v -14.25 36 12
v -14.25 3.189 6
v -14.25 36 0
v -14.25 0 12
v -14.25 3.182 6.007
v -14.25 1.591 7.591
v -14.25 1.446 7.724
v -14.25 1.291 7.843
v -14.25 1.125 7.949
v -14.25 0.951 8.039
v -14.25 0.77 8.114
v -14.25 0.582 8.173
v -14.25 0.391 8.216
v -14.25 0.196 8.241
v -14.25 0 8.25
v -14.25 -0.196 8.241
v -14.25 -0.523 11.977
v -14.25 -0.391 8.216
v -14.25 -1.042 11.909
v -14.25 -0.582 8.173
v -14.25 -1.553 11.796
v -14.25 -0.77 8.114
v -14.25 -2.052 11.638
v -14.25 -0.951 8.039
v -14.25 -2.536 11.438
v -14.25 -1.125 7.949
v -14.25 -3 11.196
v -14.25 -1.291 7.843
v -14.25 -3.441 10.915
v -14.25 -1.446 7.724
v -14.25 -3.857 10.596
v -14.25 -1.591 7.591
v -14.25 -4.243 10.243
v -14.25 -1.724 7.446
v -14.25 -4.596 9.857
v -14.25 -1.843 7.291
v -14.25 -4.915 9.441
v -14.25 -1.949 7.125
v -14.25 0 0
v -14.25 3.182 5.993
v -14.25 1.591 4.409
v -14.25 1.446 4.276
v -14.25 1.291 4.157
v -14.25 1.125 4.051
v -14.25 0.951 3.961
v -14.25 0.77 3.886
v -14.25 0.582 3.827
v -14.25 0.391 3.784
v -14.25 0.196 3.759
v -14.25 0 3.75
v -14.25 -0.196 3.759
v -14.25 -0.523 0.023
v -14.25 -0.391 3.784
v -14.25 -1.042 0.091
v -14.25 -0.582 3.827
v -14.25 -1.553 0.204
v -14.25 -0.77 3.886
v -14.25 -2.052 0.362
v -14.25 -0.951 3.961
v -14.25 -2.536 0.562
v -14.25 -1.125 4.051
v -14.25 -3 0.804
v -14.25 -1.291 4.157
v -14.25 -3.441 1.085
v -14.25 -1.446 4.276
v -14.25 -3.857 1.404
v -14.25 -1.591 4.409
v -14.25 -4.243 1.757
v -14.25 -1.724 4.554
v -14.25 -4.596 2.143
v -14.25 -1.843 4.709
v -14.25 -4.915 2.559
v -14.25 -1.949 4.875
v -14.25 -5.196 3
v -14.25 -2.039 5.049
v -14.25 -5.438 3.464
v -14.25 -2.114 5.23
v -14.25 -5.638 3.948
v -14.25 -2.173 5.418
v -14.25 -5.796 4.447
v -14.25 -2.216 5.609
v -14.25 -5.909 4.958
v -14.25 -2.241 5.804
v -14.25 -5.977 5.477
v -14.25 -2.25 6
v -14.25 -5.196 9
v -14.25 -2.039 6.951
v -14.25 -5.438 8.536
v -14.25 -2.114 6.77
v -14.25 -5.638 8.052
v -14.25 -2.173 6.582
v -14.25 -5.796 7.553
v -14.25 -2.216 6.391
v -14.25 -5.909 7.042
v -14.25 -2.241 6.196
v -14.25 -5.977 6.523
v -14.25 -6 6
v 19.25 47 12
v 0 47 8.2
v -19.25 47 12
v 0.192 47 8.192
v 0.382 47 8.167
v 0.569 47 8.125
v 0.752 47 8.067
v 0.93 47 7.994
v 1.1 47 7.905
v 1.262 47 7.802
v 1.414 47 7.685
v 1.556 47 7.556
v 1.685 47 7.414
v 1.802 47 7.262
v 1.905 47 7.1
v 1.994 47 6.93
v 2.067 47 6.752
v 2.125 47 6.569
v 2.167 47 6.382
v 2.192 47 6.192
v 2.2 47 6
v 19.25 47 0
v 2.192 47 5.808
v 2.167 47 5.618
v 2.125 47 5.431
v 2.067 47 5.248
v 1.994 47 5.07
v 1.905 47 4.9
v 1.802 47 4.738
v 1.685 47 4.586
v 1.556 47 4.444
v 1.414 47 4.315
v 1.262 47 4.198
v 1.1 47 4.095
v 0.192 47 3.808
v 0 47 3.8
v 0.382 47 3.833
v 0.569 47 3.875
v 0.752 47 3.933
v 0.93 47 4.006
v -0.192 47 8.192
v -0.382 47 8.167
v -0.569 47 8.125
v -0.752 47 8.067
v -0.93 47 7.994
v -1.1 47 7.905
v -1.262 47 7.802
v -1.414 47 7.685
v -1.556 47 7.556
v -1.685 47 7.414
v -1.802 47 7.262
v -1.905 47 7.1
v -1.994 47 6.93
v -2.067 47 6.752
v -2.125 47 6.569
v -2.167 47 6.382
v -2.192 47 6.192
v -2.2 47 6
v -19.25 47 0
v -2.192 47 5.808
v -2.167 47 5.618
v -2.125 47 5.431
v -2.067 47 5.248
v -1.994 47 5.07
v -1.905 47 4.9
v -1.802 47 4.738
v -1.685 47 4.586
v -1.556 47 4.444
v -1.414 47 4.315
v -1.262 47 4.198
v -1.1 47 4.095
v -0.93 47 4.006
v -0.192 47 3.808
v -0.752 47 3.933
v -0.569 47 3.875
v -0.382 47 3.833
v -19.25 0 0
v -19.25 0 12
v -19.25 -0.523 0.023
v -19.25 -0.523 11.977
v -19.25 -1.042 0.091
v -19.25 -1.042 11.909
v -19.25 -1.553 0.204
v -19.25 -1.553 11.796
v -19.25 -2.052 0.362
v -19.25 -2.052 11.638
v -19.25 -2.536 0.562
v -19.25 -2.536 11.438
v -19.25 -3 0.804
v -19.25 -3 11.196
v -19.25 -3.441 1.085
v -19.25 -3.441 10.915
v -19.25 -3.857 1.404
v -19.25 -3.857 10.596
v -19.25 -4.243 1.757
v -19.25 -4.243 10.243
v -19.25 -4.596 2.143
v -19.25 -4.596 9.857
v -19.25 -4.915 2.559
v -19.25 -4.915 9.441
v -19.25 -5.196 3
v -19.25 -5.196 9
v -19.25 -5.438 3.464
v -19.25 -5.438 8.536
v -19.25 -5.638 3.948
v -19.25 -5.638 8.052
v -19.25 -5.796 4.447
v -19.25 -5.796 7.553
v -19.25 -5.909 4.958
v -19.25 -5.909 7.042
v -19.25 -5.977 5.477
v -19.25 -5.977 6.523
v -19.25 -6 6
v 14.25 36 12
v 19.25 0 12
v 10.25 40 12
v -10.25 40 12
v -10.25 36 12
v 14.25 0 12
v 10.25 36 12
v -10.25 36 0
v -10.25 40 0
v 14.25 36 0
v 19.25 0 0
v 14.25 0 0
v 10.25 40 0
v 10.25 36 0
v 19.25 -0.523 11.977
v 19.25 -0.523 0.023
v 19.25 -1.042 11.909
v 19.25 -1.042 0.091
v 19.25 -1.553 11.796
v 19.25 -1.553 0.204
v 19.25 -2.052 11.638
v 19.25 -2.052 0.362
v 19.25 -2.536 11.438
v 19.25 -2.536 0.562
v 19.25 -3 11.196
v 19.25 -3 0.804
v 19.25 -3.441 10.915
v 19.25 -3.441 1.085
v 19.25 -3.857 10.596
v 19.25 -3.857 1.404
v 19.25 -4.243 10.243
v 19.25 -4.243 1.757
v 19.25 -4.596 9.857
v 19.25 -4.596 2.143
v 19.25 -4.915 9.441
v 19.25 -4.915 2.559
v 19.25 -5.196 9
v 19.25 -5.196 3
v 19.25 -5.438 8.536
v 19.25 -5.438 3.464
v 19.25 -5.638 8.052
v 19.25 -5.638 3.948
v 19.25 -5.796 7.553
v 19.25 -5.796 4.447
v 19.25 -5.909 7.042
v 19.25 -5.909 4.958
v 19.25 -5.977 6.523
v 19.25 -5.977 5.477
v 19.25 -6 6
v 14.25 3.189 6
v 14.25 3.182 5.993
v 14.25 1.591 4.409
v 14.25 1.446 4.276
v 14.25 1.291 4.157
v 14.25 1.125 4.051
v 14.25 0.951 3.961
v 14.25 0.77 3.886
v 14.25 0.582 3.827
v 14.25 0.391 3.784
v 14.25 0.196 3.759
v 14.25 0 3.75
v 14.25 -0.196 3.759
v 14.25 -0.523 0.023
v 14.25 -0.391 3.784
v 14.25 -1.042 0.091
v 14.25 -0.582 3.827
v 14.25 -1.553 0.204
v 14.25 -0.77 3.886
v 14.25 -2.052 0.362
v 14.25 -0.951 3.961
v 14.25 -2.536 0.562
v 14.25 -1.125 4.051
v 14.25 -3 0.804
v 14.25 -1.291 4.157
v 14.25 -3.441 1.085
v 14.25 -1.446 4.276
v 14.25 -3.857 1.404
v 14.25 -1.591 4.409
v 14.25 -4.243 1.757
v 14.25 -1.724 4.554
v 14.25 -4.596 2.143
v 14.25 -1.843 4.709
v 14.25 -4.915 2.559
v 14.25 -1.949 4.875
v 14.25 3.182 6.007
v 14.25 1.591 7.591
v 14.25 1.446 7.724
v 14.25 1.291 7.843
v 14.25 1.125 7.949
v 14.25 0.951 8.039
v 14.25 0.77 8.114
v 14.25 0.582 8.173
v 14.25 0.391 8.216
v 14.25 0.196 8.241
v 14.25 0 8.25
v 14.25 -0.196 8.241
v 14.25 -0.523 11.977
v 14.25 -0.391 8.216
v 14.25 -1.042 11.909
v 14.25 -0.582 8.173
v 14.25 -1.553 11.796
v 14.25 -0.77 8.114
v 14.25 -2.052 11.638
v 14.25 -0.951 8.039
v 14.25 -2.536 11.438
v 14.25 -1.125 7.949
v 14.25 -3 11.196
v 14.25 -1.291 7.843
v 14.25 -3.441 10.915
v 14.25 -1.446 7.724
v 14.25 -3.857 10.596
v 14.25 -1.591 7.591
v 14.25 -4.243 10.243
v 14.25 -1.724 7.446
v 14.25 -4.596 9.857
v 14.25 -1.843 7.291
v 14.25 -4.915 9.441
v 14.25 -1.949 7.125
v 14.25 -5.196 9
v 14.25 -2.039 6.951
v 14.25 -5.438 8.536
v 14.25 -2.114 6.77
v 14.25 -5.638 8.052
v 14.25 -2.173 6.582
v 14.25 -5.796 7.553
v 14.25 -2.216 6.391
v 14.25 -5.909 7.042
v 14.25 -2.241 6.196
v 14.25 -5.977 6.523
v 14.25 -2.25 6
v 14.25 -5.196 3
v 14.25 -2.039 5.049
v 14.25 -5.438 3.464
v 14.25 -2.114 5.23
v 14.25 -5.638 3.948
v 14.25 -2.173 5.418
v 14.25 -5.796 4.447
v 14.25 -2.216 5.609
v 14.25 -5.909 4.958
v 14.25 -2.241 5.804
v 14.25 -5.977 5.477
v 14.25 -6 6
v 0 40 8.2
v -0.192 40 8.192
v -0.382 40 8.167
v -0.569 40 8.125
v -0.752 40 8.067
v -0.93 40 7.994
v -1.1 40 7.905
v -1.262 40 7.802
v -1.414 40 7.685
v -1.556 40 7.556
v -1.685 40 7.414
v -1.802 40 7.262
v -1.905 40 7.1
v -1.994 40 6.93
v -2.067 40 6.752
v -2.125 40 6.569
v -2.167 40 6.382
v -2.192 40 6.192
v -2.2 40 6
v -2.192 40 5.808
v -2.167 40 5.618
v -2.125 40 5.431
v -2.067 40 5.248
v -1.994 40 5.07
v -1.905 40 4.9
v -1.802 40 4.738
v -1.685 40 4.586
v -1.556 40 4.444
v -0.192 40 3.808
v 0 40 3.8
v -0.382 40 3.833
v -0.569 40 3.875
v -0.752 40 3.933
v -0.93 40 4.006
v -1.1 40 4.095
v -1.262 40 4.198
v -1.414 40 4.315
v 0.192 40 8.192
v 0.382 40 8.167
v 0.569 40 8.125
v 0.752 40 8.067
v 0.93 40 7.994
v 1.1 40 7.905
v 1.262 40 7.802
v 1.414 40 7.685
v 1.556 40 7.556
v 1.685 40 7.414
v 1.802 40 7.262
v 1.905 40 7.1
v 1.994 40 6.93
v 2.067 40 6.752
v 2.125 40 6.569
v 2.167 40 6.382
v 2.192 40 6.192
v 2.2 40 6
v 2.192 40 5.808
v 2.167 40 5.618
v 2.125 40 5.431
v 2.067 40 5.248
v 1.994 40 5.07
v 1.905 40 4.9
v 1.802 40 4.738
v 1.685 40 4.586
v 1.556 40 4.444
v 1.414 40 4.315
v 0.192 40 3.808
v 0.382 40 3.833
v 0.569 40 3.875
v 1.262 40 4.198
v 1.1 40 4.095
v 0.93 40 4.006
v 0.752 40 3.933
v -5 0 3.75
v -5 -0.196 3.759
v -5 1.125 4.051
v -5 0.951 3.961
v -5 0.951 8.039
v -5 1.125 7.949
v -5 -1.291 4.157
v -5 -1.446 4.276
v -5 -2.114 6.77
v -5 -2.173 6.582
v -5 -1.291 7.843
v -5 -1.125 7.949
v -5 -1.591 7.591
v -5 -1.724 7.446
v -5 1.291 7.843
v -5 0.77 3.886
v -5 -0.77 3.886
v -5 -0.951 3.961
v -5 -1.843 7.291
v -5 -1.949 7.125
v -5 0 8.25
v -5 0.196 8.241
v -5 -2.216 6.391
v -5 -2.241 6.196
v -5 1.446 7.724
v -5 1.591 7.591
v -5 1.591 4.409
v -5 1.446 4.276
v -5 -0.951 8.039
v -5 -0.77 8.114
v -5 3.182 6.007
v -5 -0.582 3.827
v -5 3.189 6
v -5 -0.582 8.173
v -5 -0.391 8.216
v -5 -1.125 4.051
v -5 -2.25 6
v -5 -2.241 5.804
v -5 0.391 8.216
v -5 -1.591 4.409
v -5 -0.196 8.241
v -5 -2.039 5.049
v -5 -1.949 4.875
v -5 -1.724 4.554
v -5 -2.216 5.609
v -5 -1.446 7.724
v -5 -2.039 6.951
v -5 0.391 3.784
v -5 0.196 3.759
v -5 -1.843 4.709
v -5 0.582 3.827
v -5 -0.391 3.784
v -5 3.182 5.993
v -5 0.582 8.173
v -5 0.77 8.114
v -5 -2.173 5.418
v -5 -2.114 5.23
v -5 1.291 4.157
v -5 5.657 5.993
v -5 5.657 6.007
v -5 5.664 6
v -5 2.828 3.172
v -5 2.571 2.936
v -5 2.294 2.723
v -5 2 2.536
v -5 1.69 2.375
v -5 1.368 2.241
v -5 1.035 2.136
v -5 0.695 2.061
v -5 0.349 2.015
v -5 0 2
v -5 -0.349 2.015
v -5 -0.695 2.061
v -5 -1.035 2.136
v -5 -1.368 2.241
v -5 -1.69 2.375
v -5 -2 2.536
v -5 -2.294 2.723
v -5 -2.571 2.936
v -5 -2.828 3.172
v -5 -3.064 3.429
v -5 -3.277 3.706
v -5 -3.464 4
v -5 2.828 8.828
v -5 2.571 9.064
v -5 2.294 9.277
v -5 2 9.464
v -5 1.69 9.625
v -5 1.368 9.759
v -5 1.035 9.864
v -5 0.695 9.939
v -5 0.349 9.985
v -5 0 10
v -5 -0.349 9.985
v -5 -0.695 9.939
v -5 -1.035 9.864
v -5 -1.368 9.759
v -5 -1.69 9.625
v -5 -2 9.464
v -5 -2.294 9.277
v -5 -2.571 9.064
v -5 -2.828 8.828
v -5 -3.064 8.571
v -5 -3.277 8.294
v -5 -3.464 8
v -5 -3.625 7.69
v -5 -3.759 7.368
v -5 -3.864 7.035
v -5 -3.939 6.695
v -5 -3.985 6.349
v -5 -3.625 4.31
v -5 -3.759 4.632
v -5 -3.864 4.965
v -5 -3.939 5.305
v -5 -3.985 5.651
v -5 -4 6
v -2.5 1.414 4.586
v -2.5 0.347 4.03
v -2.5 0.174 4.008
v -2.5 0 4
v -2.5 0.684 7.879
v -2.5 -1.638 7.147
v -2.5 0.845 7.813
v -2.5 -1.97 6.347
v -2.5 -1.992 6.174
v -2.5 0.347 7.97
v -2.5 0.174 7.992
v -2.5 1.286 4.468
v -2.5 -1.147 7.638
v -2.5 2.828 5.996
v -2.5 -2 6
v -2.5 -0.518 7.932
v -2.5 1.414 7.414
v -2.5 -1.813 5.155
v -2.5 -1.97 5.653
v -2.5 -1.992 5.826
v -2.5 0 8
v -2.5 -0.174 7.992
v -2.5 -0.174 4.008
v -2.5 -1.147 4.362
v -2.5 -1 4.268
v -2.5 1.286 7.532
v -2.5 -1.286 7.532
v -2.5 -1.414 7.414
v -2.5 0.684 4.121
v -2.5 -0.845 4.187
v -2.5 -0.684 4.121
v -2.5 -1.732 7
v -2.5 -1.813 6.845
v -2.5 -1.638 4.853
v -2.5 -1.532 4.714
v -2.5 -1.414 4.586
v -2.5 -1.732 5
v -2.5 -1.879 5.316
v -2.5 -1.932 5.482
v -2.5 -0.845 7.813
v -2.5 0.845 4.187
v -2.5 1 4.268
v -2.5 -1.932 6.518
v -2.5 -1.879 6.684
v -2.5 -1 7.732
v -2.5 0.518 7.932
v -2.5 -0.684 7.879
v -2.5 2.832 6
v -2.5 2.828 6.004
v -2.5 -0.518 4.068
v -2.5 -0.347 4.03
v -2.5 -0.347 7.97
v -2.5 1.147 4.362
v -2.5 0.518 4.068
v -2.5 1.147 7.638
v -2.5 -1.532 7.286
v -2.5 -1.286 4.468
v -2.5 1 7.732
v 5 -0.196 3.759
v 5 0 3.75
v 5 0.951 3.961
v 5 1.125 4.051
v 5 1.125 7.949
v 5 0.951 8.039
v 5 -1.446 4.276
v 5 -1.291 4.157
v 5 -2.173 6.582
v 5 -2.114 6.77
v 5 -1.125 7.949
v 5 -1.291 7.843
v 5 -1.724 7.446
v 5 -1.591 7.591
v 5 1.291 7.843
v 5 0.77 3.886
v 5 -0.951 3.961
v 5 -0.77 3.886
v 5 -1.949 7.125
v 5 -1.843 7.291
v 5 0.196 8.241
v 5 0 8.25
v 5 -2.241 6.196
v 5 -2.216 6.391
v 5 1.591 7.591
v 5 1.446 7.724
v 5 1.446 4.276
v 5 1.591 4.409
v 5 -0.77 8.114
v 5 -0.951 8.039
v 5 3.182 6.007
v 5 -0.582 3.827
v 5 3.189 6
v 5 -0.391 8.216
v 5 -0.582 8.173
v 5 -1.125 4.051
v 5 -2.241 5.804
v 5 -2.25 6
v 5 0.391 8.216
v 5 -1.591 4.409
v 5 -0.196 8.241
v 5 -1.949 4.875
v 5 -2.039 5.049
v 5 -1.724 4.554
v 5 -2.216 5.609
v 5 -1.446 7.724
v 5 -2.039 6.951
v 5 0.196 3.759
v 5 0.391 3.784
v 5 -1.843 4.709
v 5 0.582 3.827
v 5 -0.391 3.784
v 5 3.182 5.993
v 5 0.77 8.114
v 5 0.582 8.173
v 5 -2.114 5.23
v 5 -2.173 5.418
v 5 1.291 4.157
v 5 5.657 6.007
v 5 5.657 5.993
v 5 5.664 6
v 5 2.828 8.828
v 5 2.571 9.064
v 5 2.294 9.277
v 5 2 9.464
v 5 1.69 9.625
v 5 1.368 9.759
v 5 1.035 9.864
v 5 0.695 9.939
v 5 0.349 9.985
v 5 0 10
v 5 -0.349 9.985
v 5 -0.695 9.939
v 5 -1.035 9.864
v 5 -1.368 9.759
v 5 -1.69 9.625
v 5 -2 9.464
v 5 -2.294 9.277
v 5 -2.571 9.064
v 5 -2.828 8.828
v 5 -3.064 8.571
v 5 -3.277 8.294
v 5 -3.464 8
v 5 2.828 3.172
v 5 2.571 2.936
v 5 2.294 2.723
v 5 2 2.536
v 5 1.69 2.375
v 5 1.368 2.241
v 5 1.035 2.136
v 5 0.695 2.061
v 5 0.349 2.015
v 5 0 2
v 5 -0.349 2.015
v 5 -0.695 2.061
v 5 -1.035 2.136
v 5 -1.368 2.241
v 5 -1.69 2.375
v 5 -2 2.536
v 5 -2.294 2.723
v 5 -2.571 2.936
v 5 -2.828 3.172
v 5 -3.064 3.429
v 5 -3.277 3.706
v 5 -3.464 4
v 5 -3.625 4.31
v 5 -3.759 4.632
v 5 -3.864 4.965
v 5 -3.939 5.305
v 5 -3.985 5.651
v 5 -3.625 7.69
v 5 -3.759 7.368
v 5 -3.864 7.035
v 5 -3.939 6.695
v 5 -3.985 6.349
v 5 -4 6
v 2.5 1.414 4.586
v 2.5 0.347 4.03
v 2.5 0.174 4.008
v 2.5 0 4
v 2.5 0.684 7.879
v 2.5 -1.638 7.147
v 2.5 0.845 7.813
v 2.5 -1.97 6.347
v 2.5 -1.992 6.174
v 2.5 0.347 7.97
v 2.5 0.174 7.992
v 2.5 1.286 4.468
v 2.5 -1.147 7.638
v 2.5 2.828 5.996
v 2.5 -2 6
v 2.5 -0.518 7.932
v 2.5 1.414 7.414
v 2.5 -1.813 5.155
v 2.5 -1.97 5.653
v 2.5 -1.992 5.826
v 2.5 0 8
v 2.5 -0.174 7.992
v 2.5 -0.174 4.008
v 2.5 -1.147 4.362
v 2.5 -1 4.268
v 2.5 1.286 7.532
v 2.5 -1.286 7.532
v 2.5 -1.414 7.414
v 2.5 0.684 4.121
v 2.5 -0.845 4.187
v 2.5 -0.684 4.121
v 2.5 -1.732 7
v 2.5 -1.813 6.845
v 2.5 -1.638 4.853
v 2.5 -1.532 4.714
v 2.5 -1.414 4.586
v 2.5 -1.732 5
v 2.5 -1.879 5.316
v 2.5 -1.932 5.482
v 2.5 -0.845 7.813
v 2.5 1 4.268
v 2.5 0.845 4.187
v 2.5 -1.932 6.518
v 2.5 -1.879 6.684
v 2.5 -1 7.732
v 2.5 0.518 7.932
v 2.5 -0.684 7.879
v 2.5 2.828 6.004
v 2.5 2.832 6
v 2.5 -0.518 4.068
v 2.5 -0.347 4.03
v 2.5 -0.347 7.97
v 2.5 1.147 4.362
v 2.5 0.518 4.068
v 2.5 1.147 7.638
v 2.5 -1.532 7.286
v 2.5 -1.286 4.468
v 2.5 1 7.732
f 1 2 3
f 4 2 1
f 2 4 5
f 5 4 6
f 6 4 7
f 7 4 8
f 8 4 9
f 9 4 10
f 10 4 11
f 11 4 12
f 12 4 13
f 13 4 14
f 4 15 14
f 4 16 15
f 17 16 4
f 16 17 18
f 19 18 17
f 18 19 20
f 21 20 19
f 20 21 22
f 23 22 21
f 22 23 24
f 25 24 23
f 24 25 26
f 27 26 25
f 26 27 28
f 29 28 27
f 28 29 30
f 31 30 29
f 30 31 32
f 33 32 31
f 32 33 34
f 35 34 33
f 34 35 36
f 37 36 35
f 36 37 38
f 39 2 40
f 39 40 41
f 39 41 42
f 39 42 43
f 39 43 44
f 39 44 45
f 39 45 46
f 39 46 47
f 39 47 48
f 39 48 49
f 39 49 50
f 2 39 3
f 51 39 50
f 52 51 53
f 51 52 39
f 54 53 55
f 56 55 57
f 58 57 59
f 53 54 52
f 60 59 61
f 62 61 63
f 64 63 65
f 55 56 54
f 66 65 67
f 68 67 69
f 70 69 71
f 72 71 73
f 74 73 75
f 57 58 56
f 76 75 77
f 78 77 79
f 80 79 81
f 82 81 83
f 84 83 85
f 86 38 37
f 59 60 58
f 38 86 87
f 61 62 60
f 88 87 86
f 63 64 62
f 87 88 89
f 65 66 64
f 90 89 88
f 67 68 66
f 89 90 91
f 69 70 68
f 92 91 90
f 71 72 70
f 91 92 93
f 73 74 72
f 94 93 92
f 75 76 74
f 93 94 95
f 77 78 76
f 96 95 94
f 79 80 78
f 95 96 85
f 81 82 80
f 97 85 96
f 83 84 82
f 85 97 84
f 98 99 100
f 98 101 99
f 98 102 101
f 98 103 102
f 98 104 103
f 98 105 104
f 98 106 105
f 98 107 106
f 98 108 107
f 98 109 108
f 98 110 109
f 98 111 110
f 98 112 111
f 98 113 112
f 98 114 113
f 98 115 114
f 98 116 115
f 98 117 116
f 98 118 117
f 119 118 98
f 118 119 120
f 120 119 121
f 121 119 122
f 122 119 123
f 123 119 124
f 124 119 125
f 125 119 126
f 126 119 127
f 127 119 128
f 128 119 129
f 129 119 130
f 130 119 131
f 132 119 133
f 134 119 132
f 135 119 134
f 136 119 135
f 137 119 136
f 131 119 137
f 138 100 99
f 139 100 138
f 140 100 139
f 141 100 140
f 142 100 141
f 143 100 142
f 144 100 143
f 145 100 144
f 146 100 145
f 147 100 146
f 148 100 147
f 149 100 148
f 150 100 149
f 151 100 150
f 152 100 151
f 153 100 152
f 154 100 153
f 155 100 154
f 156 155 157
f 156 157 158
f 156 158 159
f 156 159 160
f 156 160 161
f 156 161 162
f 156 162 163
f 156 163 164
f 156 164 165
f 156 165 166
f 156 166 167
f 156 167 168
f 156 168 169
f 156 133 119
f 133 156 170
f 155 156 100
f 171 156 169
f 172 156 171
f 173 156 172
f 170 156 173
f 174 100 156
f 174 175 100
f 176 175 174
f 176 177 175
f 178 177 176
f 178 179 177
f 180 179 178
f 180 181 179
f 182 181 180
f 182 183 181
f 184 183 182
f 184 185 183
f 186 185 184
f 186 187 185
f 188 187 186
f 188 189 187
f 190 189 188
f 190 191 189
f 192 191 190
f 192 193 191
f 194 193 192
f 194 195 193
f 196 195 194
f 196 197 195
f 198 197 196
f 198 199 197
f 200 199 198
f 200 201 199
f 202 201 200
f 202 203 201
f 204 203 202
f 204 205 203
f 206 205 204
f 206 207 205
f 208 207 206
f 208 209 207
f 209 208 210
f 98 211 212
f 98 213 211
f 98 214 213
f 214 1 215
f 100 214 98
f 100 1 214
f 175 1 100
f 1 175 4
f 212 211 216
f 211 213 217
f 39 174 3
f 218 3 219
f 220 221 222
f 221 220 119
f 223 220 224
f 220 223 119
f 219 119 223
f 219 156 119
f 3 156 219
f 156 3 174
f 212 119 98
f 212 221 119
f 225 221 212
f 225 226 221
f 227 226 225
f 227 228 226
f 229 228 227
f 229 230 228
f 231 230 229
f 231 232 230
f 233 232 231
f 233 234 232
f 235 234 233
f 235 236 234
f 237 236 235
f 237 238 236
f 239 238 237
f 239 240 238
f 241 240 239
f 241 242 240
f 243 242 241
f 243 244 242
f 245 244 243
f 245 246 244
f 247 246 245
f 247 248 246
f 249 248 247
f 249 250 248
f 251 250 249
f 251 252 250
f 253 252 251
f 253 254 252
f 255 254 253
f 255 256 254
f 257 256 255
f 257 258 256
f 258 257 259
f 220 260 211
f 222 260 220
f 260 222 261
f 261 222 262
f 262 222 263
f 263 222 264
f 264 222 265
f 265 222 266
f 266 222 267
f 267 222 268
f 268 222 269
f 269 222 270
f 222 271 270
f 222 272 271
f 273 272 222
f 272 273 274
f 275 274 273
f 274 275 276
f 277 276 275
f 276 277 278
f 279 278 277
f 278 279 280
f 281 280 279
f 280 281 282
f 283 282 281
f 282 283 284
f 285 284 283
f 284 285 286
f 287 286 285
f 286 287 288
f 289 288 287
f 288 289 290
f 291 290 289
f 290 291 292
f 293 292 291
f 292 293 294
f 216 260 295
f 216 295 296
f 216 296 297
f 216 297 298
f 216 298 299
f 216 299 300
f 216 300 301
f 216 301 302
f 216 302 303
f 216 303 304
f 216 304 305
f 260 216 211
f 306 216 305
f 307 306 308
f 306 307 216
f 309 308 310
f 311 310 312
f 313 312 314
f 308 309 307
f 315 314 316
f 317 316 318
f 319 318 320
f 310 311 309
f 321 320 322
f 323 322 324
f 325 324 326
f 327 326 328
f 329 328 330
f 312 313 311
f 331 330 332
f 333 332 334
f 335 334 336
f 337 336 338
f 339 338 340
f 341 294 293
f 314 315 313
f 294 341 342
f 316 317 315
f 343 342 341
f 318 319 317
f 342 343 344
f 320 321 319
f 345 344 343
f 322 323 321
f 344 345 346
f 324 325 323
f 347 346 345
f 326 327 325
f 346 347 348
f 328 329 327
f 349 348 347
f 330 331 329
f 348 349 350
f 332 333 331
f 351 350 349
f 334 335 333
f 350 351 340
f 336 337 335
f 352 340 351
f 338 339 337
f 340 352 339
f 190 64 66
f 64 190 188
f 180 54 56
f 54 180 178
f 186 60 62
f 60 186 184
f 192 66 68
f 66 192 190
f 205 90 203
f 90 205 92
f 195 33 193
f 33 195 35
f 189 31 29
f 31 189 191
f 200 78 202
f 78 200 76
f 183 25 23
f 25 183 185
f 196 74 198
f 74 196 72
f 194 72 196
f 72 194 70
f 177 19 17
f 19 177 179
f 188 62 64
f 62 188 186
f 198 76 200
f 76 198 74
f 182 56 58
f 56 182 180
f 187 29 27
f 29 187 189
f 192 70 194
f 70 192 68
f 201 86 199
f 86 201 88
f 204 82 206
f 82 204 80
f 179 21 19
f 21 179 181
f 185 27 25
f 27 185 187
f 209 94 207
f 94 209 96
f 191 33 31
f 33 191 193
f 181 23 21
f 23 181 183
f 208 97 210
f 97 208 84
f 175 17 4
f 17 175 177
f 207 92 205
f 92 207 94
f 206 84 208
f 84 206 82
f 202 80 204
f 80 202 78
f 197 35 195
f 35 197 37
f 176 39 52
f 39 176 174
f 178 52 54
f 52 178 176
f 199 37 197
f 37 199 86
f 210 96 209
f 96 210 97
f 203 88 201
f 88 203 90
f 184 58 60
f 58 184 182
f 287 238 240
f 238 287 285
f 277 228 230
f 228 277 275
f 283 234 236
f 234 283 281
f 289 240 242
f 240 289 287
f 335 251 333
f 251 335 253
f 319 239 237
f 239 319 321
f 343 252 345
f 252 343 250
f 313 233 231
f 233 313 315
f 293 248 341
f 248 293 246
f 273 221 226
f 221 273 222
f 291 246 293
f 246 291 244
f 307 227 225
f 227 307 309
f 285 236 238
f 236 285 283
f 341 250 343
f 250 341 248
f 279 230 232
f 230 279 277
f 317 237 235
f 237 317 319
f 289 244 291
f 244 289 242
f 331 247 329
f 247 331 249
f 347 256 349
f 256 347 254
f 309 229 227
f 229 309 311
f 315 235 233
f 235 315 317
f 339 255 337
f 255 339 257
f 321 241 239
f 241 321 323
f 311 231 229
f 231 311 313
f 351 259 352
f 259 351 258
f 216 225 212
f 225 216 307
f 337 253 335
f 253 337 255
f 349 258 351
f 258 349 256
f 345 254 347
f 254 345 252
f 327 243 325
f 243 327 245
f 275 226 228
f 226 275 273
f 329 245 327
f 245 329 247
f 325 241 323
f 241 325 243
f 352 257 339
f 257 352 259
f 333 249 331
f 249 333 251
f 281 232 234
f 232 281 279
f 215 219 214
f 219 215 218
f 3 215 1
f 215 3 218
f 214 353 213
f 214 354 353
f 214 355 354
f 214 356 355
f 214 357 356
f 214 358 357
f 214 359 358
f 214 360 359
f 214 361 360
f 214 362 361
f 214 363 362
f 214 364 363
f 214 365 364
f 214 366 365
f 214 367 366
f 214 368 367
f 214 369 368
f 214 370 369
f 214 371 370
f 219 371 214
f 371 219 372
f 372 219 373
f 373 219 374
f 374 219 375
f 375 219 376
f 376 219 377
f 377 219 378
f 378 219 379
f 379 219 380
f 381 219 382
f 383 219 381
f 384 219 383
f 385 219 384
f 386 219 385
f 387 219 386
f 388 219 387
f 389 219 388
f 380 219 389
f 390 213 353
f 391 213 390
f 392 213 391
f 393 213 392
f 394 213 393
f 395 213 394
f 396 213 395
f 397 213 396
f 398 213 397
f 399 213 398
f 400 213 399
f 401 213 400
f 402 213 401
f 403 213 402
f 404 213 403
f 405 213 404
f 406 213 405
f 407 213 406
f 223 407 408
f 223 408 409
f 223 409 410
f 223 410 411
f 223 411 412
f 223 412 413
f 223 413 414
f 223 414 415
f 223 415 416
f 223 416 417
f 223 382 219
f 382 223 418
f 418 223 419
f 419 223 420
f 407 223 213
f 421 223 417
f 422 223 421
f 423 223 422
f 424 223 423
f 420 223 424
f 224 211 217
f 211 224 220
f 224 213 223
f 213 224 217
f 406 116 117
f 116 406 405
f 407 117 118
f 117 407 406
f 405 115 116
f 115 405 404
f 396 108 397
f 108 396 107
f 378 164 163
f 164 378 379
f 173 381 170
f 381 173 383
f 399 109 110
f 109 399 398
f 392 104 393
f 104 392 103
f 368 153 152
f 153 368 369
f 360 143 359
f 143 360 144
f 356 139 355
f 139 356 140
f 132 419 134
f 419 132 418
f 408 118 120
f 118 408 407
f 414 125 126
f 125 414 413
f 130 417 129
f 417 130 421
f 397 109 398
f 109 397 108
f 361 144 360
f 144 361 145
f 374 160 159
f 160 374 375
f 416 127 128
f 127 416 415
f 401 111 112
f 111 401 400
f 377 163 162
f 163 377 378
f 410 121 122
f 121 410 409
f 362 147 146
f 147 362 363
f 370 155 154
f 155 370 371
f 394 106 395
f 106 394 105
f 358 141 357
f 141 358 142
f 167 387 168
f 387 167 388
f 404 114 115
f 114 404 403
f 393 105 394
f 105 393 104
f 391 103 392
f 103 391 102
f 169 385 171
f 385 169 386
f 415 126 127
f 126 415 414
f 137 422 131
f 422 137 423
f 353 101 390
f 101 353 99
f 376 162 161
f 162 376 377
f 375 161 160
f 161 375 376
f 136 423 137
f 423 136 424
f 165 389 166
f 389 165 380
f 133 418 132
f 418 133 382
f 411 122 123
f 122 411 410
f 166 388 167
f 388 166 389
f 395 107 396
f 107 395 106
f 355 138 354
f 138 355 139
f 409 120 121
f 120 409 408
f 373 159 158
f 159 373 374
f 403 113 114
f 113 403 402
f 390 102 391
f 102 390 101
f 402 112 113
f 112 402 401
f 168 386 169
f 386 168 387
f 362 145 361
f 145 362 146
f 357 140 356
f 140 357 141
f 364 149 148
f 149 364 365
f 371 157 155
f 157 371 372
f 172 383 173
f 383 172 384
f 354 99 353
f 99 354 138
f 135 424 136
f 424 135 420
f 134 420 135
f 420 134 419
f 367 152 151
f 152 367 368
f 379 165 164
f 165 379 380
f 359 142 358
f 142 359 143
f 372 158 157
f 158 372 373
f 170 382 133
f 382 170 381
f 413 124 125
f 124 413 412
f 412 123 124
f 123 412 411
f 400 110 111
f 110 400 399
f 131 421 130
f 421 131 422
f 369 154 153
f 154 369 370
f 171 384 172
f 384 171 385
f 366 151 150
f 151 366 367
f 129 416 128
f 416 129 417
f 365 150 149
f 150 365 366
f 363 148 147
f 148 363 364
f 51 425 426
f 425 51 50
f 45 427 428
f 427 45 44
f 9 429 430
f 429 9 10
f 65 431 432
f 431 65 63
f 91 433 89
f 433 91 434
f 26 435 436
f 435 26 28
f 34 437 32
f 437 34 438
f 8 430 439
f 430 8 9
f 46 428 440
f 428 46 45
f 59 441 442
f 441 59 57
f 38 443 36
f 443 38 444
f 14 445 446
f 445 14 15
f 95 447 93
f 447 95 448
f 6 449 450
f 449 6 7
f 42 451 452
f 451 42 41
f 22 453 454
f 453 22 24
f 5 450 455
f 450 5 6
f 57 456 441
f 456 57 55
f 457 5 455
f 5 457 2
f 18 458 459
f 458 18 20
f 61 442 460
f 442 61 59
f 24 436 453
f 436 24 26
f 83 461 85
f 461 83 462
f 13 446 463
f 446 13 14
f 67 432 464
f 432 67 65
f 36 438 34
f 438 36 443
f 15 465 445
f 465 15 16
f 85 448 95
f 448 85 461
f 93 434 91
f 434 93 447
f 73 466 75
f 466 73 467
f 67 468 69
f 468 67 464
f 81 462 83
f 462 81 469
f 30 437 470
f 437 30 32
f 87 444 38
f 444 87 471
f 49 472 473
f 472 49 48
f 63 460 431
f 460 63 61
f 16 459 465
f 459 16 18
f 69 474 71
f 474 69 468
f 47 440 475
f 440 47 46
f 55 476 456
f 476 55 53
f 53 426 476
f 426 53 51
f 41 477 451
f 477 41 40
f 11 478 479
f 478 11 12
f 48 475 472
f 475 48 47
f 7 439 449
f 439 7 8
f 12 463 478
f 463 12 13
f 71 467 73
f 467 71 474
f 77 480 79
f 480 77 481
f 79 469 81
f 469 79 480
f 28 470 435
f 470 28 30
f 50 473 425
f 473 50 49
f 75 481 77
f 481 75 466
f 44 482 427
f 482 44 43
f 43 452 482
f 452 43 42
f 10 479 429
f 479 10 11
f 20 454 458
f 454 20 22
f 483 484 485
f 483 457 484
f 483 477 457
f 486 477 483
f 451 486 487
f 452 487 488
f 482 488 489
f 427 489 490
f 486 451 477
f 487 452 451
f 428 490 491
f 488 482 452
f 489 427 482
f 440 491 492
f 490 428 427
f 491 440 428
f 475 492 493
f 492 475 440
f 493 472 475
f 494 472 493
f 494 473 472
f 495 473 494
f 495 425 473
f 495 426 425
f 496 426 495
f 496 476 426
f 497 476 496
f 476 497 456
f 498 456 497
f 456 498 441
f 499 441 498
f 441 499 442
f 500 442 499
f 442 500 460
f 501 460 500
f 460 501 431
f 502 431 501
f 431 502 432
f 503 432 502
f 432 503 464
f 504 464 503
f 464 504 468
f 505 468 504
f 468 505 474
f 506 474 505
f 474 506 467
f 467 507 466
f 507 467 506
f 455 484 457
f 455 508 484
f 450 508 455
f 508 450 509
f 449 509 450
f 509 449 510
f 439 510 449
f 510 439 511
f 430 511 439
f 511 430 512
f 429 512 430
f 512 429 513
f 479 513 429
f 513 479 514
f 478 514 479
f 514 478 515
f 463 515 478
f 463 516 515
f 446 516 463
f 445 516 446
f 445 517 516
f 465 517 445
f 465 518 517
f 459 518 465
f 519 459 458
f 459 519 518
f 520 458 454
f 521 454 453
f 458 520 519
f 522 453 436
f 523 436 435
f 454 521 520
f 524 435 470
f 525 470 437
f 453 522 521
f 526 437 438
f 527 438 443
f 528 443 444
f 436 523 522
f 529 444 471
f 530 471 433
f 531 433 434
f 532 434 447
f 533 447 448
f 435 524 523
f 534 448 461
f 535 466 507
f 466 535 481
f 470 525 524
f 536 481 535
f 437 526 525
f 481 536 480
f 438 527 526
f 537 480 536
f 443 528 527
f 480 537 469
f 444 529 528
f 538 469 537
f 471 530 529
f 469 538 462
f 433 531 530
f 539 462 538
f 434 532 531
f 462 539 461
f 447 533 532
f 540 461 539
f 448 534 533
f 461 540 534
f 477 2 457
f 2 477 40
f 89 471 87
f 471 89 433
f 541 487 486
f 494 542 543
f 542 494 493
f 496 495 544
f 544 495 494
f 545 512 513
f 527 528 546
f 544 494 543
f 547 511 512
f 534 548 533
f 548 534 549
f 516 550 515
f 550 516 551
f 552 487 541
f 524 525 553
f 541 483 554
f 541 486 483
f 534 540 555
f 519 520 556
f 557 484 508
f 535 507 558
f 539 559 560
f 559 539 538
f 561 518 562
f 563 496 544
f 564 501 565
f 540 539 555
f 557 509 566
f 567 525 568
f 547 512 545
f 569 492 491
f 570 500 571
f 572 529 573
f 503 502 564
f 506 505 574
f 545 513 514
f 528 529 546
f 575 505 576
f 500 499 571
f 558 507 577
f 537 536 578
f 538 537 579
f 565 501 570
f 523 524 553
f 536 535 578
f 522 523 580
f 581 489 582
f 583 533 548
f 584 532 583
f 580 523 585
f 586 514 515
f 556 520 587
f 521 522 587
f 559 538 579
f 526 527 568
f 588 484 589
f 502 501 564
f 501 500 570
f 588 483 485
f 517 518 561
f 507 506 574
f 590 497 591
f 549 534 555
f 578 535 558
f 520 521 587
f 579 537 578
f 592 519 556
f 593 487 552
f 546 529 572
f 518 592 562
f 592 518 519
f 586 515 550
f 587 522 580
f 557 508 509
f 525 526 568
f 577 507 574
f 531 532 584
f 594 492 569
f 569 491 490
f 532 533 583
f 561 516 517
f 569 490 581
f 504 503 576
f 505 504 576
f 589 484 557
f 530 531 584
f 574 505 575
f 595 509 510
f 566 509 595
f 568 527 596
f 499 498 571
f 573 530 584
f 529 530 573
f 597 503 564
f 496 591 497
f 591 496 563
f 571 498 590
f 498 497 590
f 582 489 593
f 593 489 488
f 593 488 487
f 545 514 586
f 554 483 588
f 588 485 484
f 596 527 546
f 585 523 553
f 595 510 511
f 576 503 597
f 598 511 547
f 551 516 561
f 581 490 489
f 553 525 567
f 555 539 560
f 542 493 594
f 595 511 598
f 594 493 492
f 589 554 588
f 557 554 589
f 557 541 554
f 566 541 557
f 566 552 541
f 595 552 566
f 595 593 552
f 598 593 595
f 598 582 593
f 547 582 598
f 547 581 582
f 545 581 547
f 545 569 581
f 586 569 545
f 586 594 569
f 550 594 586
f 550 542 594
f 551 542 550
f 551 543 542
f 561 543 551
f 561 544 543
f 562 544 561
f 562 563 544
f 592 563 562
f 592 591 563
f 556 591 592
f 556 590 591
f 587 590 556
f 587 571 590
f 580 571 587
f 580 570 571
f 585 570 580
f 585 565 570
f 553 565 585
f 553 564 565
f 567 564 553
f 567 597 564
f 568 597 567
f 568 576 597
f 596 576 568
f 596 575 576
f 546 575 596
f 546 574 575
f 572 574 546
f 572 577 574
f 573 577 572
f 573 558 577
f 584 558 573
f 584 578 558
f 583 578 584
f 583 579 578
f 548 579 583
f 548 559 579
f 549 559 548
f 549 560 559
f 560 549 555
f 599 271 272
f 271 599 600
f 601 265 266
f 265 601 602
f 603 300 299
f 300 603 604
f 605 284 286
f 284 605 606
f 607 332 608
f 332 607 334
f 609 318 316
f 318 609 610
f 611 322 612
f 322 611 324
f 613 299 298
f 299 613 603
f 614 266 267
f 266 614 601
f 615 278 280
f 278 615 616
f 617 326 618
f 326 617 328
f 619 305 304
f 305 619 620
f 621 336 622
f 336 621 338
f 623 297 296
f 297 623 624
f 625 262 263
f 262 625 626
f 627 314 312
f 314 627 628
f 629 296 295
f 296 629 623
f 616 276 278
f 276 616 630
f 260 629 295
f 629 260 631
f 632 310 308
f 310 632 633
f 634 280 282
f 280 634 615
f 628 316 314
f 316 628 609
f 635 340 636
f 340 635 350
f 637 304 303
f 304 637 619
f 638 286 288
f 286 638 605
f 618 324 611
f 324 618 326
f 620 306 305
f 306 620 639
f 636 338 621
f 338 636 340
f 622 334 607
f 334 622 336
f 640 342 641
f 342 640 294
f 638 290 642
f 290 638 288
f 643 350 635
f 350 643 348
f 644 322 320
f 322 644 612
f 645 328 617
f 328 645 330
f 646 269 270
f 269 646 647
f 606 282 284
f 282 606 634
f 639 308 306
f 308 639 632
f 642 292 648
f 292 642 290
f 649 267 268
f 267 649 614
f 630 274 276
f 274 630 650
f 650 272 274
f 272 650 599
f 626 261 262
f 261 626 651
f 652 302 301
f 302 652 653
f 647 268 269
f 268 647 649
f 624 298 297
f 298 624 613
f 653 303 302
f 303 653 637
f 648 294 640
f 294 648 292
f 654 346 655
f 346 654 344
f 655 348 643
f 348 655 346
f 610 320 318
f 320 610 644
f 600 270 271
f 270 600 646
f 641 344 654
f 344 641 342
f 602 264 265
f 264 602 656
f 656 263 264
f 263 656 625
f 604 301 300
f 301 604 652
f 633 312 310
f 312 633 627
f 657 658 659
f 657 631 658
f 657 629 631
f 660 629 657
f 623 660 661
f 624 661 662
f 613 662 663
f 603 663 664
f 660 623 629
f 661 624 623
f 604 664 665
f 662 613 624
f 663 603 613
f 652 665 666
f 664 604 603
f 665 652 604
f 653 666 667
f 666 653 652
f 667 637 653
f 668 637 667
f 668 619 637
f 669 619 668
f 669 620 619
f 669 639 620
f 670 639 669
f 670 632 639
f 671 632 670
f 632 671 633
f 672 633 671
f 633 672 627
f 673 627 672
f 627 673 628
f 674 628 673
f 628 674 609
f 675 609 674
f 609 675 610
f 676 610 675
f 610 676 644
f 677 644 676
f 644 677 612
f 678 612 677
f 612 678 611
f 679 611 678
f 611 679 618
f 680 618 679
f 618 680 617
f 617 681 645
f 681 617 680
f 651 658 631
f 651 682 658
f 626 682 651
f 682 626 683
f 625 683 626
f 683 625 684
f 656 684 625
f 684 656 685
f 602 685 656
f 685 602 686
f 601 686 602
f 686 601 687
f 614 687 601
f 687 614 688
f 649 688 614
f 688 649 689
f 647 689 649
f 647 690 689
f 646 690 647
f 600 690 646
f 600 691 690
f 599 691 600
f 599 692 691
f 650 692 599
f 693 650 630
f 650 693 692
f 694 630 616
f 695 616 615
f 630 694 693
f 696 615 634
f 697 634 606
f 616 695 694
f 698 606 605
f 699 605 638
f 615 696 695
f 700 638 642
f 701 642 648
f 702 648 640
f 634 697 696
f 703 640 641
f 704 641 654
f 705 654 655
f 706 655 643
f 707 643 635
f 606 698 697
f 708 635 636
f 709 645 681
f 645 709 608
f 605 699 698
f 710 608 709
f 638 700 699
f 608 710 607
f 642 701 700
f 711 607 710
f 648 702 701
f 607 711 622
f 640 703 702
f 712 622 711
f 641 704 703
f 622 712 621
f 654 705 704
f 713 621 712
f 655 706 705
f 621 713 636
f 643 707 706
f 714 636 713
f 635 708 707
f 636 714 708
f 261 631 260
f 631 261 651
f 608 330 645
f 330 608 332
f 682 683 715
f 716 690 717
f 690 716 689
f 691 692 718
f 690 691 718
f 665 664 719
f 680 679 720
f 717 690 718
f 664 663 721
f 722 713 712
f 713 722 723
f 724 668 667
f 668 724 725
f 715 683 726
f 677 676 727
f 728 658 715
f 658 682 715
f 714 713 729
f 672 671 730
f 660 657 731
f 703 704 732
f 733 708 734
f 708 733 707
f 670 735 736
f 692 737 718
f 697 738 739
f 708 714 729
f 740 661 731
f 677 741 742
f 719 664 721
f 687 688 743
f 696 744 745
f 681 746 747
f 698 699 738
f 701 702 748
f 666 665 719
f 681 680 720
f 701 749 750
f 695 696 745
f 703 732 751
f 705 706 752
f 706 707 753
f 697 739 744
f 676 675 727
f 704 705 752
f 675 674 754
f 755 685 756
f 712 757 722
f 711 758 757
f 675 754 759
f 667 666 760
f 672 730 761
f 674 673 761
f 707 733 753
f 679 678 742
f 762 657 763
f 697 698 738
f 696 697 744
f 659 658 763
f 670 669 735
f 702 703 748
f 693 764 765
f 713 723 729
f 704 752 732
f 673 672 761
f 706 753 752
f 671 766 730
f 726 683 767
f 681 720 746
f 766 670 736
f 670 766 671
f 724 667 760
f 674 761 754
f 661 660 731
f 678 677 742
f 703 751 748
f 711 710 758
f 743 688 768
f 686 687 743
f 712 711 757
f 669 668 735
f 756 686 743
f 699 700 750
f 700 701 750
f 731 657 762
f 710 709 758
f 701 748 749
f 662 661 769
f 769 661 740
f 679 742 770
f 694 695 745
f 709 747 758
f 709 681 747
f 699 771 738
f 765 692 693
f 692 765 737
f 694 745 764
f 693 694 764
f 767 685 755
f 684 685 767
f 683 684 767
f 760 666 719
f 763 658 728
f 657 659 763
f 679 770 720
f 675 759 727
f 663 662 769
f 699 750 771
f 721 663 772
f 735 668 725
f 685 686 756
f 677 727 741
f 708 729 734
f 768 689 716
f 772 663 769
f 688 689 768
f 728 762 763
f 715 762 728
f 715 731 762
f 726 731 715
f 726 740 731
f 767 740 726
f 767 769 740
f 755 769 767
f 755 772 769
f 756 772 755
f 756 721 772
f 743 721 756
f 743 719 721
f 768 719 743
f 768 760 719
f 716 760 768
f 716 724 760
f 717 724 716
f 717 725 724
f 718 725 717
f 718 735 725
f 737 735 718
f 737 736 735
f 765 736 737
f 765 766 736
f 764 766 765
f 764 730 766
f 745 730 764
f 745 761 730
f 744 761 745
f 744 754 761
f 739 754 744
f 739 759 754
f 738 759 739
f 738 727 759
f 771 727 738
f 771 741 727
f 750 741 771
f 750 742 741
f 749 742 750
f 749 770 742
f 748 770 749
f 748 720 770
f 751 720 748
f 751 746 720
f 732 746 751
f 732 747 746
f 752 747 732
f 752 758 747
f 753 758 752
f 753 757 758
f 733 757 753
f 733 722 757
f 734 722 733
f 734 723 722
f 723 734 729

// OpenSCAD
// magnet_hanger.scad - free-swinging hanger for the KK-P20/15 electromagnet
// =============================================================================
// The arm has no wrist servo, so a magnet bolted to the forearm tilts with it.
// This U-shaped hanger hooks into two Ø6 mm holes drilled across the forearm end
// and swings freely, so gravity keeps the magnet face pointing straight down.
//
//          side view of forearm end              front view (looking along the arm)
//      ______________________                    hook ->|  |<- hook (pegs point inward)
//     |                      |  35               |  |=======|  |
//     |            (o)<-hole |  tall             |  |  arm  |  |   arm end 27 wide
//     |____________^_________|                   |  |=======|  |
//                  17.5 from front, 17.5 up      |  |       |  |
//                                                |  |_______|  |  <- hanger, swings
//                                                |_____[o]_____|  <- screw into magnet
//                                                    [magnet]
//
// Print: TPU (95A), lying flat exactly as exported (no supports). 0.2 mm layers,
// 3 walls, 40 % infill, slow (20-25 mm/s), retraction off or very short.
// Pegs use a teardrop profile so they print without support; the hanger hangs on
// the round top of the peg, so the point never touches the hole.
//
// Fit: TPU is flexible, so just pull one arm outward, push its peg into the hole until
// the barb pops through the wall into the hollow, then do the other side. The barb is
// solid and oversized: TPU squeezes through the hole and springs back open inside.

part = "hanger";      // hanger | peg_test | assembly
$fn = 72;

// ---- forearm end (measured, ±1-2 mm) -------------------------------------------
arm_width   = 27.0;   // across the arm, side face to side face        [measured]
wall        = 8.0;    // side-wall thickness before the hollow inside  [measured ~7, +1 margin]
hole_d      = 6.0;    // drill size                                    [measured]
pivot_up    = 17.5;   // hole centre above the arm's bottom edge       [measured]
pivot_back  = 17.5;   // hole centre back from the arm's front edge    [measured]

// ---- magnet -------------------------------------------------------------------------
mag_d       = 20.0;
mag_h       = 15.0;
screw_d     = 4.4;    // passes M3 (use a washer) and M4

// ---- hanger ------------------------------------------------------------------------
side_gap    = 0.75;   // clearance between each hanger arm and the forearm side face
drop        = 40.0;   // pivot centre -> top of the bottom bar (swing clearance, >= 35)
bar_t       = 7.0;    // bottom bar thickness (TPU: stiffer under the magnet)
arm_t       = 5.0;    // TPU: thicker arms so the hanger sways less
depth       = 12.0;   // hanger thickness along the forearm (TPU: wider = steadier)
top_above   = 6.0;    // hanger arm continues this far above the pivot

peg_d       = 4.5;            // ~20 % thinner than before: spins freely in a melted Ø6 hole
peg_play    = 0.5;            // axial play so it swings without binding
barb_len    = 2.5;
barb_d      = hole_d + 2.0;   // 8 mm: TPU squeezes through Ø6 and springs open behind the wall
barb_tip_d  = 4.0;            // pointed tip so it starts into the hole easily
split_w     = 0;              // no split: TPU flexes enough, and a solid barb holds better
split_len   = barb_len + 3.0;

inner = arm_width + 2 * side_gap;                 // gap between the two hanger arms
outer = inner + 2 * arm_t;
shaft_len = side_gap + wall + peg_play;          // arm face -> inner side of the wall

// 2D teardrop pointing toward -Y (print bed after the export rotation)
module teardrop(d) {
  r = d / 2;
  hull() {
    circle(r = r);
    translate([0, -r * sqrt(2)]) rotate(45) square(0.01, center = true);
  }
}

// One peg: shaft + barb, built along +X from the origin.
module peg() {
  rotate([0, 90, 0]) rotate([0, 0, 90]) {
    linear_extrude(shaft_len) teardrop(peg_d);
    translate([0, 0, shaft_len])
      linear_extrude(barb_len, scale = barb_tip_d / barb_d) teardrop(barb_d);
  }
}

module peg_with_split() {
  if (split_w <= 0) peg(); else difference() {
    peg();
    // vertical slot (in print orientation) through the barb end
    translate([shaft_len + barb_len - split_len, -split_w / 2, -barb_d])
      cube([split_len + 0.1, split_w, 2 * barb_d]);
  }
}

// Hanger in use orientation: X = pivot axis (across the arm), Z = up, Y = along the arm.
// Pivot at the origin.
module hanger_use() {
  bar_top = -drop;
  difference() {
    union() {
      // two arms
      for (s = [-1, 1])
        translate([s * (inner / 2 + arm_t / 2) - arm_t / 2, -depth / 2, bar_top - bar_t])
          cube([arm_t, depth, drop + bar_t + top_above - depth / 2]);
      // rounded arm tops around the pivot
      for (s = [-1, 1])
        translate([s * (inner / 2 + arm_t / 2), 0, top_above - depth / 2])
          rotate([0, 90, 0]) cylinder(d = depth, h = arm_t, center = true);
      // bottom bar
      translate([-outer / 2, -depth / 2, bar_top - bar_t]) cube([outer, depth, bar_t]);
      // inner fillets between arms and bar
      for (s = [-1, 1])
        translate([s * (inner / 2 - 2), 0, bar_top + 2]) cube([4, depth, 4], center = true);
    }
    // screw hole into the magnet (vertical in use)
    translate([0, 0, bar_top - bar_t - 1]) cylinder(d = screw_d, h = bar_t + 2);
  }
  // pegs pointing inward from each arm
  translate([-inner / 2, 0, 0]) peg_with_split();
  translate([inner / 2, 0, 0]) mirror([1, 0, 0]) peg_with_split();
}

// Print orientation: lay the hanger flat (its 10 mm thickness becomes the height).
module hanger_print() {
  translate([0, 0, depth / 2]) rotate([90, 0, 0]) hanger_use();
}

// A small coupon: one peg on a tab, to test the fit in a drilled hole first.
module peg_test() {
  translate([0, 0, depth / 2]) rotate([90, 0, 0]) {
    translate([-arm_t, -depth / 2, -8]) cube([arm_t, depth, 16]);
    peg_with_split();
  }
}

// ---- assembly preview with a ghost forearm end and magnet -------------------------
module assembly() {
  color("SteelBlue") hanger_use();
  // forearm end (ghost), pivot at origin
  %translate([-arm_width / 2, -pivot_back - 25, -pivot_up]) cube([arm_width, pivot_back + 25, 35]);
  color("silver") translate([0, 0, -drop - bar_t - mag_h]) cylinder(d = mag_d, h = mag_h);
}

if (part == "hanger") hanger_print();
else if (part == "peg_test") peg_test();
else if (part == "assembly") assembly();

echo(str("Pivot -> magnet face = ", drop + bar_t + mag_h, " mm  (use as TOOL_DOWN)"));
echo(str("Hanger outside width = ", outer, " mm, inside gap = ", inner, " mm"));
echo(str("Peg shaft = ", shaft_len, " mm, barb Ø", barb_d, " -> Ø", barb_tip_d));
